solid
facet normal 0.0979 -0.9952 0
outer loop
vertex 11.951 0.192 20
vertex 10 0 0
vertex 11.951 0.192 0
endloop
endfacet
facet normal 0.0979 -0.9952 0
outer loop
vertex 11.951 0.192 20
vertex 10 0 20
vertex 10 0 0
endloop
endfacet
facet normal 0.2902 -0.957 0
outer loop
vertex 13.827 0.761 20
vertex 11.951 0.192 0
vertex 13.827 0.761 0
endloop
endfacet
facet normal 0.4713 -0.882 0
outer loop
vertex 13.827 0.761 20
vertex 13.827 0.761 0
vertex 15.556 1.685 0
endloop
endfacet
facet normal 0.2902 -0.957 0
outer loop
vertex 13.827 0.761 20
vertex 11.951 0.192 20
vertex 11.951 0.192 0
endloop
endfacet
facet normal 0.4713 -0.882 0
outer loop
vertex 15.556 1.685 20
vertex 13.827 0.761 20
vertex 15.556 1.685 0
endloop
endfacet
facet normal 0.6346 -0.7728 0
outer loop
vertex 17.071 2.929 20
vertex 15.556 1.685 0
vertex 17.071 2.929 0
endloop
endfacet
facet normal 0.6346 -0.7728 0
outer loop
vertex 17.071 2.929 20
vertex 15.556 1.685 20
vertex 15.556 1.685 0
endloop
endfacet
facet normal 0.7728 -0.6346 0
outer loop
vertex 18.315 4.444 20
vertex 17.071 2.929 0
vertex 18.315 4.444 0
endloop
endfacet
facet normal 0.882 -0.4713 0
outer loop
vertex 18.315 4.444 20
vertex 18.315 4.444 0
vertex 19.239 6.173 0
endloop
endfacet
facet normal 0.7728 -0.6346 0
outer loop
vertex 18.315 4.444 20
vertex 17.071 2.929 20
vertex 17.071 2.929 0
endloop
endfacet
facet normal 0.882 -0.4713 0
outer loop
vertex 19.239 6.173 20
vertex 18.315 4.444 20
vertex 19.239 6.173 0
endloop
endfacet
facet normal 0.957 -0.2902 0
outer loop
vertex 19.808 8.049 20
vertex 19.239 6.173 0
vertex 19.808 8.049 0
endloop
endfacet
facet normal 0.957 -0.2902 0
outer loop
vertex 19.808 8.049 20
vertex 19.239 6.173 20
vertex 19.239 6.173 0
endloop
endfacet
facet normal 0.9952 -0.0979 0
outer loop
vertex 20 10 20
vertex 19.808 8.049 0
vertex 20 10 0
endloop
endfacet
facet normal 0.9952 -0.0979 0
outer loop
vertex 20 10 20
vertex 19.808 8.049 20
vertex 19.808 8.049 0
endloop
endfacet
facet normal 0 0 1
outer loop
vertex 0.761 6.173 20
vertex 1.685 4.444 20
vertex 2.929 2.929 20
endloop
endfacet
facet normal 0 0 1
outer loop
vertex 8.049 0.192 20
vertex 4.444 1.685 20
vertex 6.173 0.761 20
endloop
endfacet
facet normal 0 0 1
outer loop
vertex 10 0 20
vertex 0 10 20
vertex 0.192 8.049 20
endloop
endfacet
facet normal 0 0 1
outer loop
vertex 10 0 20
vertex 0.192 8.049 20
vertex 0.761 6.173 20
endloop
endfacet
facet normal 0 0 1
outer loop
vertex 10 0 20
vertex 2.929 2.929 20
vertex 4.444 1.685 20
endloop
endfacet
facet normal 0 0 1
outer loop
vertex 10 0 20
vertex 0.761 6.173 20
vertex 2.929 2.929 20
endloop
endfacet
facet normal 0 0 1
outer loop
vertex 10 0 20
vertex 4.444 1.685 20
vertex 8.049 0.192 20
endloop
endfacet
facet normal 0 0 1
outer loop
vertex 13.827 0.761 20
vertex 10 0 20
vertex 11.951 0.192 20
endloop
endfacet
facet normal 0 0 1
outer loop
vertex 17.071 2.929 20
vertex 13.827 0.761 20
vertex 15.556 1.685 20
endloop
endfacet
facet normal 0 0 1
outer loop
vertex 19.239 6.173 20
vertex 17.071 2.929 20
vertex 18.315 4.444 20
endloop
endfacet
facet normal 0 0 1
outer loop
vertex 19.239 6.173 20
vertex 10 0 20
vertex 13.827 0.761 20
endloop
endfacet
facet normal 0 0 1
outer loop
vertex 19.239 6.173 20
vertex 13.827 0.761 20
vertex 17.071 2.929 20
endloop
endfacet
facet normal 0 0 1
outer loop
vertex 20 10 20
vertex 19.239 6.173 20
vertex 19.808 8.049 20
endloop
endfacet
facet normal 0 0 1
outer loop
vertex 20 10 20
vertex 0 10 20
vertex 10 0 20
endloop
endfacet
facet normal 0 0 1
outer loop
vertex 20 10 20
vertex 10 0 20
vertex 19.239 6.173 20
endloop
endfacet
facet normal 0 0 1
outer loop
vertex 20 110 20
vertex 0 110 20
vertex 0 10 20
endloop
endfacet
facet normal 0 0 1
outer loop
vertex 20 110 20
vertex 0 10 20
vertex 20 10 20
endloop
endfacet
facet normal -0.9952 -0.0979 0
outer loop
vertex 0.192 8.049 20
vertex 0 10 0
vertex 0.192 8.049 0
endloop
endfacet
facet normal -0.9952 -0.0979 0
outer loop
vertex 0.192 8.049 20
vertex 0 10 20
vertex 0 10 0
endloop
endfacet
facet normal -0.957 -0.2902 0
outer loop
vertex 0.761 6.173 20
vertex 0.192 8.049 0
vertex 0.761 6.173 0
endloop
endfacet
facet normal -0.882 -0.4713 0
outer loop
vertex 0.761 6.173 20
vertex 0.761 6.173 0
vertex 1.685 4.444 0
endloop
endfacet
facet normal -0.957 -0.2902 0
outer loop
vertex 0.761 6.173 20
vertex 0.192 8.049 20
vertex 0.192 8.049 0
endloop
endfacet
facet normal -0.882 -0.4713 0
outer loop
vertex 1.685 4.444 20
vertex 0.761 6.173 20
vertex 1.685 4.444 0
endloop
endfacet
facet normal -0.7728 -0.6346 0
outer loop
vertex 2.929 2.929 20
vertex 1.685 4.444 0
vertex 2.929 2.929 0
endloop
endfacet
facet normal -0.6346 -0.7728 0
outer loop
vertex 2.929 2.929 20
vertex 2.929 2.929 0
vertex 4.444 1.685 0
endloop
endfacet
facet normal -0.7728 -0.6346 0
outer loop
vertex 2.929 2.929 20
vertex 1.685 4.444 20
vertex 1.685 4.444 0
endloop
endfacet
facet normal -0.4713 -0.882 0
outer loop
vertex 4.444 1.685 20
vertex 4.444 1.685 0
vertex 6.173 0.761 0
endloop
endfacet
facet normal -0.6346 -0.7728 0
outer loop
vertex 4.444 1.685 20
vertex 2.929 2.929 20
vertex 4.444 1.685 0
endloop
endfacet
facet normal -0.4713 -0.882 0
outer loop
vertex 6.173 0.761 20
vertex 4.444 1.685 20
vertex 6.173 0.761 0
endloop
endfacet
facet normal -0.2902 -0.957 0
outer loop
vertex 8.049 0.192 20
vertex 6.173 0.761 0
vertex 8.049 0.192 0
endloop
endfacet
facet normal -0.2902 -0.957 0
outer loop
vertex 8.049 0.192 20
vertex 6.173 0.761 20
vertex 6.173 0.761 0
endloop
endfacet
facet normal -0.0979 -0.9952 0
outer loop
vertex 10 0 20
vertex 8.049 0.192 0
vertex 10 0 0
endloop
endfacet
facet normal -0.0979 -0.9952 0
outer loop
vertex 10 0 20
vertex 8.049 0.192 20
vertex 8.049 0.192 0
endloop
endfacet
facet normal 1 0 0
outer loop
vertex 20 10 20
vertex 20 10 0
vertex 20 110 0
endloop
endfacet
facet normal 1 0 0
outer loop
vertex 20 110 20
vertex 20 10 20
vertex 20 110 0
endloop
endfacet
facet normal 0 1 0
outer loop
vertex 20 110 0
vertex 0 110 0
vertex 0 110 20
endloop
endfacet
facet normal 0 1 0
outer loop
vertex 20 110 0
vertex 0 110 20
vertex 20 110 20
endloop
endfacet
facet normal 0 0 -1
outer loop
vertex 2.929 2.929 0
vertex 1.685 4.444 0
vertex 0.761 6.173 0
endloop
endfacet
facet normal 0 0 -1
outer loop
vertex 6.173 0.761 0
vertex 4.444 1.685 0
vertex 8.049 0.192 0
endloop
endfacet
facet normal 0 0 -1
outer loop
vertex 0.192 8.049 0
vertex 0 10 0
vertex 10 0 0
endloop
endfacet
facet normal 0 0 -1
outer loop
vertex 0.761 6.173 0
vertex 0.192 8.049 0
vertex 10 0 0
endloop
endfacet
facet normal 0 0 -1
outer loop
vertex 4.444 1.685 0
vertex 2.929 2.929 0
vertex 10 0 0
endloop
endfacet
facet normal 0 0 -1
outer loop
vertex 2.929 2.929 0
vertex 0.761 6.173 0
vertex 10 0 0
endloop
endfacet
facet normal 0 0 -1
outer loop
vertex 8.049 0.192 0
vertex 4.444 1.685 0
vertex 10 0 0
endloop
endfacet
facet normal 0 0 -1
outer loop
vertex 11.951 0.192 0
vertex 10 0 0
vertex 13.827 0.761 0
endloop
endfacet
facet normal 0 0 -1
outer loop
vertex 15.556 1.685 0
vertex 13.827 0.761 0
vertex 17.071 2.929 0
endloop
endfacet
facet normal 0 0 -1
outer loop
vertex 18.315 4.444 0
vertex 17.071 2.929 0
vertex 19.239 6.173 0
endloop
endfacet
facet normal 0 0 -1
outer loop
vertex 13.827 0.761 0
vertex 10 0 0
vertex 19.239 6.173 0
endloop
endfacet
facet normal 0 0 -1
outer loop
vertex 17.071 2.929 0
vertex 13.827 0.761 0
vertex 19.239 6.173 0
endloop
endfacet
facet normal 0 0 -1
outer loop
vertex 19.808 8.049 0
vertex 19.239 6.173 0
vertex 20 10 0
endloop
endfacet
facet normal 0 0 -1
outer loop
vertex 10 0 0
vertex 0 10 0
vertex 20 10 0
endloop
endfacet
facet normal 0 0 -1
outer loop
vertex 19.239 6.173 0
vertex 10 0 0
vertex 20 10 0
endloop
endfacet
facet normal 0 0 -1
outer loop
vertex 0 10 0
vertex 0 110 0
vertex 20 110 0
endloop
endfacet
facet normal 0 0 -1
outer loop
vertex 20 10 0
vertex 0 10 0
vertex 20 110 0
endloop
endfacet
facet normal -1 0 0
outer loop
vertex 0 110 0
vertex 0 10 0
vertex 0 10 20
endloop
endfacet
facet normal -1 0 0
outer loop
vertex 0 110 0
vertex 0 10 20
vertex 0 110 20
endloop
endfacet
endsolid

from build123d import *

# Parameters (mm, degrees)
ESQUISSE1_W        = 20
ESQUISSE1_H        = 110
BOSS_EXTRU_1_DEPTH = 20
CONG_3_R           = 10


with BuildPart() as part:
    # Esquisse1 → Boss.-Extru.1 (new body)
    with BuildSketch(Plane.XY):
        with Locations((10, 55)):
            Rectangle(ESQUISSE1_W, ESQUISSE1_H)
    extrude(amount=BOSS_EXTRU_1_DEPTH)

    # Congé3
    cong_3_edges = [part.edges().sort_by_distance(p)[0] for p in [
        (0, 0, 10),
        (20, 0, 10),
    ]]
    fillet(cong_3_edges, radius=CONG_3_R - 0.0001)  # a hair under: the kernel refuses the full size


solid = part.part
